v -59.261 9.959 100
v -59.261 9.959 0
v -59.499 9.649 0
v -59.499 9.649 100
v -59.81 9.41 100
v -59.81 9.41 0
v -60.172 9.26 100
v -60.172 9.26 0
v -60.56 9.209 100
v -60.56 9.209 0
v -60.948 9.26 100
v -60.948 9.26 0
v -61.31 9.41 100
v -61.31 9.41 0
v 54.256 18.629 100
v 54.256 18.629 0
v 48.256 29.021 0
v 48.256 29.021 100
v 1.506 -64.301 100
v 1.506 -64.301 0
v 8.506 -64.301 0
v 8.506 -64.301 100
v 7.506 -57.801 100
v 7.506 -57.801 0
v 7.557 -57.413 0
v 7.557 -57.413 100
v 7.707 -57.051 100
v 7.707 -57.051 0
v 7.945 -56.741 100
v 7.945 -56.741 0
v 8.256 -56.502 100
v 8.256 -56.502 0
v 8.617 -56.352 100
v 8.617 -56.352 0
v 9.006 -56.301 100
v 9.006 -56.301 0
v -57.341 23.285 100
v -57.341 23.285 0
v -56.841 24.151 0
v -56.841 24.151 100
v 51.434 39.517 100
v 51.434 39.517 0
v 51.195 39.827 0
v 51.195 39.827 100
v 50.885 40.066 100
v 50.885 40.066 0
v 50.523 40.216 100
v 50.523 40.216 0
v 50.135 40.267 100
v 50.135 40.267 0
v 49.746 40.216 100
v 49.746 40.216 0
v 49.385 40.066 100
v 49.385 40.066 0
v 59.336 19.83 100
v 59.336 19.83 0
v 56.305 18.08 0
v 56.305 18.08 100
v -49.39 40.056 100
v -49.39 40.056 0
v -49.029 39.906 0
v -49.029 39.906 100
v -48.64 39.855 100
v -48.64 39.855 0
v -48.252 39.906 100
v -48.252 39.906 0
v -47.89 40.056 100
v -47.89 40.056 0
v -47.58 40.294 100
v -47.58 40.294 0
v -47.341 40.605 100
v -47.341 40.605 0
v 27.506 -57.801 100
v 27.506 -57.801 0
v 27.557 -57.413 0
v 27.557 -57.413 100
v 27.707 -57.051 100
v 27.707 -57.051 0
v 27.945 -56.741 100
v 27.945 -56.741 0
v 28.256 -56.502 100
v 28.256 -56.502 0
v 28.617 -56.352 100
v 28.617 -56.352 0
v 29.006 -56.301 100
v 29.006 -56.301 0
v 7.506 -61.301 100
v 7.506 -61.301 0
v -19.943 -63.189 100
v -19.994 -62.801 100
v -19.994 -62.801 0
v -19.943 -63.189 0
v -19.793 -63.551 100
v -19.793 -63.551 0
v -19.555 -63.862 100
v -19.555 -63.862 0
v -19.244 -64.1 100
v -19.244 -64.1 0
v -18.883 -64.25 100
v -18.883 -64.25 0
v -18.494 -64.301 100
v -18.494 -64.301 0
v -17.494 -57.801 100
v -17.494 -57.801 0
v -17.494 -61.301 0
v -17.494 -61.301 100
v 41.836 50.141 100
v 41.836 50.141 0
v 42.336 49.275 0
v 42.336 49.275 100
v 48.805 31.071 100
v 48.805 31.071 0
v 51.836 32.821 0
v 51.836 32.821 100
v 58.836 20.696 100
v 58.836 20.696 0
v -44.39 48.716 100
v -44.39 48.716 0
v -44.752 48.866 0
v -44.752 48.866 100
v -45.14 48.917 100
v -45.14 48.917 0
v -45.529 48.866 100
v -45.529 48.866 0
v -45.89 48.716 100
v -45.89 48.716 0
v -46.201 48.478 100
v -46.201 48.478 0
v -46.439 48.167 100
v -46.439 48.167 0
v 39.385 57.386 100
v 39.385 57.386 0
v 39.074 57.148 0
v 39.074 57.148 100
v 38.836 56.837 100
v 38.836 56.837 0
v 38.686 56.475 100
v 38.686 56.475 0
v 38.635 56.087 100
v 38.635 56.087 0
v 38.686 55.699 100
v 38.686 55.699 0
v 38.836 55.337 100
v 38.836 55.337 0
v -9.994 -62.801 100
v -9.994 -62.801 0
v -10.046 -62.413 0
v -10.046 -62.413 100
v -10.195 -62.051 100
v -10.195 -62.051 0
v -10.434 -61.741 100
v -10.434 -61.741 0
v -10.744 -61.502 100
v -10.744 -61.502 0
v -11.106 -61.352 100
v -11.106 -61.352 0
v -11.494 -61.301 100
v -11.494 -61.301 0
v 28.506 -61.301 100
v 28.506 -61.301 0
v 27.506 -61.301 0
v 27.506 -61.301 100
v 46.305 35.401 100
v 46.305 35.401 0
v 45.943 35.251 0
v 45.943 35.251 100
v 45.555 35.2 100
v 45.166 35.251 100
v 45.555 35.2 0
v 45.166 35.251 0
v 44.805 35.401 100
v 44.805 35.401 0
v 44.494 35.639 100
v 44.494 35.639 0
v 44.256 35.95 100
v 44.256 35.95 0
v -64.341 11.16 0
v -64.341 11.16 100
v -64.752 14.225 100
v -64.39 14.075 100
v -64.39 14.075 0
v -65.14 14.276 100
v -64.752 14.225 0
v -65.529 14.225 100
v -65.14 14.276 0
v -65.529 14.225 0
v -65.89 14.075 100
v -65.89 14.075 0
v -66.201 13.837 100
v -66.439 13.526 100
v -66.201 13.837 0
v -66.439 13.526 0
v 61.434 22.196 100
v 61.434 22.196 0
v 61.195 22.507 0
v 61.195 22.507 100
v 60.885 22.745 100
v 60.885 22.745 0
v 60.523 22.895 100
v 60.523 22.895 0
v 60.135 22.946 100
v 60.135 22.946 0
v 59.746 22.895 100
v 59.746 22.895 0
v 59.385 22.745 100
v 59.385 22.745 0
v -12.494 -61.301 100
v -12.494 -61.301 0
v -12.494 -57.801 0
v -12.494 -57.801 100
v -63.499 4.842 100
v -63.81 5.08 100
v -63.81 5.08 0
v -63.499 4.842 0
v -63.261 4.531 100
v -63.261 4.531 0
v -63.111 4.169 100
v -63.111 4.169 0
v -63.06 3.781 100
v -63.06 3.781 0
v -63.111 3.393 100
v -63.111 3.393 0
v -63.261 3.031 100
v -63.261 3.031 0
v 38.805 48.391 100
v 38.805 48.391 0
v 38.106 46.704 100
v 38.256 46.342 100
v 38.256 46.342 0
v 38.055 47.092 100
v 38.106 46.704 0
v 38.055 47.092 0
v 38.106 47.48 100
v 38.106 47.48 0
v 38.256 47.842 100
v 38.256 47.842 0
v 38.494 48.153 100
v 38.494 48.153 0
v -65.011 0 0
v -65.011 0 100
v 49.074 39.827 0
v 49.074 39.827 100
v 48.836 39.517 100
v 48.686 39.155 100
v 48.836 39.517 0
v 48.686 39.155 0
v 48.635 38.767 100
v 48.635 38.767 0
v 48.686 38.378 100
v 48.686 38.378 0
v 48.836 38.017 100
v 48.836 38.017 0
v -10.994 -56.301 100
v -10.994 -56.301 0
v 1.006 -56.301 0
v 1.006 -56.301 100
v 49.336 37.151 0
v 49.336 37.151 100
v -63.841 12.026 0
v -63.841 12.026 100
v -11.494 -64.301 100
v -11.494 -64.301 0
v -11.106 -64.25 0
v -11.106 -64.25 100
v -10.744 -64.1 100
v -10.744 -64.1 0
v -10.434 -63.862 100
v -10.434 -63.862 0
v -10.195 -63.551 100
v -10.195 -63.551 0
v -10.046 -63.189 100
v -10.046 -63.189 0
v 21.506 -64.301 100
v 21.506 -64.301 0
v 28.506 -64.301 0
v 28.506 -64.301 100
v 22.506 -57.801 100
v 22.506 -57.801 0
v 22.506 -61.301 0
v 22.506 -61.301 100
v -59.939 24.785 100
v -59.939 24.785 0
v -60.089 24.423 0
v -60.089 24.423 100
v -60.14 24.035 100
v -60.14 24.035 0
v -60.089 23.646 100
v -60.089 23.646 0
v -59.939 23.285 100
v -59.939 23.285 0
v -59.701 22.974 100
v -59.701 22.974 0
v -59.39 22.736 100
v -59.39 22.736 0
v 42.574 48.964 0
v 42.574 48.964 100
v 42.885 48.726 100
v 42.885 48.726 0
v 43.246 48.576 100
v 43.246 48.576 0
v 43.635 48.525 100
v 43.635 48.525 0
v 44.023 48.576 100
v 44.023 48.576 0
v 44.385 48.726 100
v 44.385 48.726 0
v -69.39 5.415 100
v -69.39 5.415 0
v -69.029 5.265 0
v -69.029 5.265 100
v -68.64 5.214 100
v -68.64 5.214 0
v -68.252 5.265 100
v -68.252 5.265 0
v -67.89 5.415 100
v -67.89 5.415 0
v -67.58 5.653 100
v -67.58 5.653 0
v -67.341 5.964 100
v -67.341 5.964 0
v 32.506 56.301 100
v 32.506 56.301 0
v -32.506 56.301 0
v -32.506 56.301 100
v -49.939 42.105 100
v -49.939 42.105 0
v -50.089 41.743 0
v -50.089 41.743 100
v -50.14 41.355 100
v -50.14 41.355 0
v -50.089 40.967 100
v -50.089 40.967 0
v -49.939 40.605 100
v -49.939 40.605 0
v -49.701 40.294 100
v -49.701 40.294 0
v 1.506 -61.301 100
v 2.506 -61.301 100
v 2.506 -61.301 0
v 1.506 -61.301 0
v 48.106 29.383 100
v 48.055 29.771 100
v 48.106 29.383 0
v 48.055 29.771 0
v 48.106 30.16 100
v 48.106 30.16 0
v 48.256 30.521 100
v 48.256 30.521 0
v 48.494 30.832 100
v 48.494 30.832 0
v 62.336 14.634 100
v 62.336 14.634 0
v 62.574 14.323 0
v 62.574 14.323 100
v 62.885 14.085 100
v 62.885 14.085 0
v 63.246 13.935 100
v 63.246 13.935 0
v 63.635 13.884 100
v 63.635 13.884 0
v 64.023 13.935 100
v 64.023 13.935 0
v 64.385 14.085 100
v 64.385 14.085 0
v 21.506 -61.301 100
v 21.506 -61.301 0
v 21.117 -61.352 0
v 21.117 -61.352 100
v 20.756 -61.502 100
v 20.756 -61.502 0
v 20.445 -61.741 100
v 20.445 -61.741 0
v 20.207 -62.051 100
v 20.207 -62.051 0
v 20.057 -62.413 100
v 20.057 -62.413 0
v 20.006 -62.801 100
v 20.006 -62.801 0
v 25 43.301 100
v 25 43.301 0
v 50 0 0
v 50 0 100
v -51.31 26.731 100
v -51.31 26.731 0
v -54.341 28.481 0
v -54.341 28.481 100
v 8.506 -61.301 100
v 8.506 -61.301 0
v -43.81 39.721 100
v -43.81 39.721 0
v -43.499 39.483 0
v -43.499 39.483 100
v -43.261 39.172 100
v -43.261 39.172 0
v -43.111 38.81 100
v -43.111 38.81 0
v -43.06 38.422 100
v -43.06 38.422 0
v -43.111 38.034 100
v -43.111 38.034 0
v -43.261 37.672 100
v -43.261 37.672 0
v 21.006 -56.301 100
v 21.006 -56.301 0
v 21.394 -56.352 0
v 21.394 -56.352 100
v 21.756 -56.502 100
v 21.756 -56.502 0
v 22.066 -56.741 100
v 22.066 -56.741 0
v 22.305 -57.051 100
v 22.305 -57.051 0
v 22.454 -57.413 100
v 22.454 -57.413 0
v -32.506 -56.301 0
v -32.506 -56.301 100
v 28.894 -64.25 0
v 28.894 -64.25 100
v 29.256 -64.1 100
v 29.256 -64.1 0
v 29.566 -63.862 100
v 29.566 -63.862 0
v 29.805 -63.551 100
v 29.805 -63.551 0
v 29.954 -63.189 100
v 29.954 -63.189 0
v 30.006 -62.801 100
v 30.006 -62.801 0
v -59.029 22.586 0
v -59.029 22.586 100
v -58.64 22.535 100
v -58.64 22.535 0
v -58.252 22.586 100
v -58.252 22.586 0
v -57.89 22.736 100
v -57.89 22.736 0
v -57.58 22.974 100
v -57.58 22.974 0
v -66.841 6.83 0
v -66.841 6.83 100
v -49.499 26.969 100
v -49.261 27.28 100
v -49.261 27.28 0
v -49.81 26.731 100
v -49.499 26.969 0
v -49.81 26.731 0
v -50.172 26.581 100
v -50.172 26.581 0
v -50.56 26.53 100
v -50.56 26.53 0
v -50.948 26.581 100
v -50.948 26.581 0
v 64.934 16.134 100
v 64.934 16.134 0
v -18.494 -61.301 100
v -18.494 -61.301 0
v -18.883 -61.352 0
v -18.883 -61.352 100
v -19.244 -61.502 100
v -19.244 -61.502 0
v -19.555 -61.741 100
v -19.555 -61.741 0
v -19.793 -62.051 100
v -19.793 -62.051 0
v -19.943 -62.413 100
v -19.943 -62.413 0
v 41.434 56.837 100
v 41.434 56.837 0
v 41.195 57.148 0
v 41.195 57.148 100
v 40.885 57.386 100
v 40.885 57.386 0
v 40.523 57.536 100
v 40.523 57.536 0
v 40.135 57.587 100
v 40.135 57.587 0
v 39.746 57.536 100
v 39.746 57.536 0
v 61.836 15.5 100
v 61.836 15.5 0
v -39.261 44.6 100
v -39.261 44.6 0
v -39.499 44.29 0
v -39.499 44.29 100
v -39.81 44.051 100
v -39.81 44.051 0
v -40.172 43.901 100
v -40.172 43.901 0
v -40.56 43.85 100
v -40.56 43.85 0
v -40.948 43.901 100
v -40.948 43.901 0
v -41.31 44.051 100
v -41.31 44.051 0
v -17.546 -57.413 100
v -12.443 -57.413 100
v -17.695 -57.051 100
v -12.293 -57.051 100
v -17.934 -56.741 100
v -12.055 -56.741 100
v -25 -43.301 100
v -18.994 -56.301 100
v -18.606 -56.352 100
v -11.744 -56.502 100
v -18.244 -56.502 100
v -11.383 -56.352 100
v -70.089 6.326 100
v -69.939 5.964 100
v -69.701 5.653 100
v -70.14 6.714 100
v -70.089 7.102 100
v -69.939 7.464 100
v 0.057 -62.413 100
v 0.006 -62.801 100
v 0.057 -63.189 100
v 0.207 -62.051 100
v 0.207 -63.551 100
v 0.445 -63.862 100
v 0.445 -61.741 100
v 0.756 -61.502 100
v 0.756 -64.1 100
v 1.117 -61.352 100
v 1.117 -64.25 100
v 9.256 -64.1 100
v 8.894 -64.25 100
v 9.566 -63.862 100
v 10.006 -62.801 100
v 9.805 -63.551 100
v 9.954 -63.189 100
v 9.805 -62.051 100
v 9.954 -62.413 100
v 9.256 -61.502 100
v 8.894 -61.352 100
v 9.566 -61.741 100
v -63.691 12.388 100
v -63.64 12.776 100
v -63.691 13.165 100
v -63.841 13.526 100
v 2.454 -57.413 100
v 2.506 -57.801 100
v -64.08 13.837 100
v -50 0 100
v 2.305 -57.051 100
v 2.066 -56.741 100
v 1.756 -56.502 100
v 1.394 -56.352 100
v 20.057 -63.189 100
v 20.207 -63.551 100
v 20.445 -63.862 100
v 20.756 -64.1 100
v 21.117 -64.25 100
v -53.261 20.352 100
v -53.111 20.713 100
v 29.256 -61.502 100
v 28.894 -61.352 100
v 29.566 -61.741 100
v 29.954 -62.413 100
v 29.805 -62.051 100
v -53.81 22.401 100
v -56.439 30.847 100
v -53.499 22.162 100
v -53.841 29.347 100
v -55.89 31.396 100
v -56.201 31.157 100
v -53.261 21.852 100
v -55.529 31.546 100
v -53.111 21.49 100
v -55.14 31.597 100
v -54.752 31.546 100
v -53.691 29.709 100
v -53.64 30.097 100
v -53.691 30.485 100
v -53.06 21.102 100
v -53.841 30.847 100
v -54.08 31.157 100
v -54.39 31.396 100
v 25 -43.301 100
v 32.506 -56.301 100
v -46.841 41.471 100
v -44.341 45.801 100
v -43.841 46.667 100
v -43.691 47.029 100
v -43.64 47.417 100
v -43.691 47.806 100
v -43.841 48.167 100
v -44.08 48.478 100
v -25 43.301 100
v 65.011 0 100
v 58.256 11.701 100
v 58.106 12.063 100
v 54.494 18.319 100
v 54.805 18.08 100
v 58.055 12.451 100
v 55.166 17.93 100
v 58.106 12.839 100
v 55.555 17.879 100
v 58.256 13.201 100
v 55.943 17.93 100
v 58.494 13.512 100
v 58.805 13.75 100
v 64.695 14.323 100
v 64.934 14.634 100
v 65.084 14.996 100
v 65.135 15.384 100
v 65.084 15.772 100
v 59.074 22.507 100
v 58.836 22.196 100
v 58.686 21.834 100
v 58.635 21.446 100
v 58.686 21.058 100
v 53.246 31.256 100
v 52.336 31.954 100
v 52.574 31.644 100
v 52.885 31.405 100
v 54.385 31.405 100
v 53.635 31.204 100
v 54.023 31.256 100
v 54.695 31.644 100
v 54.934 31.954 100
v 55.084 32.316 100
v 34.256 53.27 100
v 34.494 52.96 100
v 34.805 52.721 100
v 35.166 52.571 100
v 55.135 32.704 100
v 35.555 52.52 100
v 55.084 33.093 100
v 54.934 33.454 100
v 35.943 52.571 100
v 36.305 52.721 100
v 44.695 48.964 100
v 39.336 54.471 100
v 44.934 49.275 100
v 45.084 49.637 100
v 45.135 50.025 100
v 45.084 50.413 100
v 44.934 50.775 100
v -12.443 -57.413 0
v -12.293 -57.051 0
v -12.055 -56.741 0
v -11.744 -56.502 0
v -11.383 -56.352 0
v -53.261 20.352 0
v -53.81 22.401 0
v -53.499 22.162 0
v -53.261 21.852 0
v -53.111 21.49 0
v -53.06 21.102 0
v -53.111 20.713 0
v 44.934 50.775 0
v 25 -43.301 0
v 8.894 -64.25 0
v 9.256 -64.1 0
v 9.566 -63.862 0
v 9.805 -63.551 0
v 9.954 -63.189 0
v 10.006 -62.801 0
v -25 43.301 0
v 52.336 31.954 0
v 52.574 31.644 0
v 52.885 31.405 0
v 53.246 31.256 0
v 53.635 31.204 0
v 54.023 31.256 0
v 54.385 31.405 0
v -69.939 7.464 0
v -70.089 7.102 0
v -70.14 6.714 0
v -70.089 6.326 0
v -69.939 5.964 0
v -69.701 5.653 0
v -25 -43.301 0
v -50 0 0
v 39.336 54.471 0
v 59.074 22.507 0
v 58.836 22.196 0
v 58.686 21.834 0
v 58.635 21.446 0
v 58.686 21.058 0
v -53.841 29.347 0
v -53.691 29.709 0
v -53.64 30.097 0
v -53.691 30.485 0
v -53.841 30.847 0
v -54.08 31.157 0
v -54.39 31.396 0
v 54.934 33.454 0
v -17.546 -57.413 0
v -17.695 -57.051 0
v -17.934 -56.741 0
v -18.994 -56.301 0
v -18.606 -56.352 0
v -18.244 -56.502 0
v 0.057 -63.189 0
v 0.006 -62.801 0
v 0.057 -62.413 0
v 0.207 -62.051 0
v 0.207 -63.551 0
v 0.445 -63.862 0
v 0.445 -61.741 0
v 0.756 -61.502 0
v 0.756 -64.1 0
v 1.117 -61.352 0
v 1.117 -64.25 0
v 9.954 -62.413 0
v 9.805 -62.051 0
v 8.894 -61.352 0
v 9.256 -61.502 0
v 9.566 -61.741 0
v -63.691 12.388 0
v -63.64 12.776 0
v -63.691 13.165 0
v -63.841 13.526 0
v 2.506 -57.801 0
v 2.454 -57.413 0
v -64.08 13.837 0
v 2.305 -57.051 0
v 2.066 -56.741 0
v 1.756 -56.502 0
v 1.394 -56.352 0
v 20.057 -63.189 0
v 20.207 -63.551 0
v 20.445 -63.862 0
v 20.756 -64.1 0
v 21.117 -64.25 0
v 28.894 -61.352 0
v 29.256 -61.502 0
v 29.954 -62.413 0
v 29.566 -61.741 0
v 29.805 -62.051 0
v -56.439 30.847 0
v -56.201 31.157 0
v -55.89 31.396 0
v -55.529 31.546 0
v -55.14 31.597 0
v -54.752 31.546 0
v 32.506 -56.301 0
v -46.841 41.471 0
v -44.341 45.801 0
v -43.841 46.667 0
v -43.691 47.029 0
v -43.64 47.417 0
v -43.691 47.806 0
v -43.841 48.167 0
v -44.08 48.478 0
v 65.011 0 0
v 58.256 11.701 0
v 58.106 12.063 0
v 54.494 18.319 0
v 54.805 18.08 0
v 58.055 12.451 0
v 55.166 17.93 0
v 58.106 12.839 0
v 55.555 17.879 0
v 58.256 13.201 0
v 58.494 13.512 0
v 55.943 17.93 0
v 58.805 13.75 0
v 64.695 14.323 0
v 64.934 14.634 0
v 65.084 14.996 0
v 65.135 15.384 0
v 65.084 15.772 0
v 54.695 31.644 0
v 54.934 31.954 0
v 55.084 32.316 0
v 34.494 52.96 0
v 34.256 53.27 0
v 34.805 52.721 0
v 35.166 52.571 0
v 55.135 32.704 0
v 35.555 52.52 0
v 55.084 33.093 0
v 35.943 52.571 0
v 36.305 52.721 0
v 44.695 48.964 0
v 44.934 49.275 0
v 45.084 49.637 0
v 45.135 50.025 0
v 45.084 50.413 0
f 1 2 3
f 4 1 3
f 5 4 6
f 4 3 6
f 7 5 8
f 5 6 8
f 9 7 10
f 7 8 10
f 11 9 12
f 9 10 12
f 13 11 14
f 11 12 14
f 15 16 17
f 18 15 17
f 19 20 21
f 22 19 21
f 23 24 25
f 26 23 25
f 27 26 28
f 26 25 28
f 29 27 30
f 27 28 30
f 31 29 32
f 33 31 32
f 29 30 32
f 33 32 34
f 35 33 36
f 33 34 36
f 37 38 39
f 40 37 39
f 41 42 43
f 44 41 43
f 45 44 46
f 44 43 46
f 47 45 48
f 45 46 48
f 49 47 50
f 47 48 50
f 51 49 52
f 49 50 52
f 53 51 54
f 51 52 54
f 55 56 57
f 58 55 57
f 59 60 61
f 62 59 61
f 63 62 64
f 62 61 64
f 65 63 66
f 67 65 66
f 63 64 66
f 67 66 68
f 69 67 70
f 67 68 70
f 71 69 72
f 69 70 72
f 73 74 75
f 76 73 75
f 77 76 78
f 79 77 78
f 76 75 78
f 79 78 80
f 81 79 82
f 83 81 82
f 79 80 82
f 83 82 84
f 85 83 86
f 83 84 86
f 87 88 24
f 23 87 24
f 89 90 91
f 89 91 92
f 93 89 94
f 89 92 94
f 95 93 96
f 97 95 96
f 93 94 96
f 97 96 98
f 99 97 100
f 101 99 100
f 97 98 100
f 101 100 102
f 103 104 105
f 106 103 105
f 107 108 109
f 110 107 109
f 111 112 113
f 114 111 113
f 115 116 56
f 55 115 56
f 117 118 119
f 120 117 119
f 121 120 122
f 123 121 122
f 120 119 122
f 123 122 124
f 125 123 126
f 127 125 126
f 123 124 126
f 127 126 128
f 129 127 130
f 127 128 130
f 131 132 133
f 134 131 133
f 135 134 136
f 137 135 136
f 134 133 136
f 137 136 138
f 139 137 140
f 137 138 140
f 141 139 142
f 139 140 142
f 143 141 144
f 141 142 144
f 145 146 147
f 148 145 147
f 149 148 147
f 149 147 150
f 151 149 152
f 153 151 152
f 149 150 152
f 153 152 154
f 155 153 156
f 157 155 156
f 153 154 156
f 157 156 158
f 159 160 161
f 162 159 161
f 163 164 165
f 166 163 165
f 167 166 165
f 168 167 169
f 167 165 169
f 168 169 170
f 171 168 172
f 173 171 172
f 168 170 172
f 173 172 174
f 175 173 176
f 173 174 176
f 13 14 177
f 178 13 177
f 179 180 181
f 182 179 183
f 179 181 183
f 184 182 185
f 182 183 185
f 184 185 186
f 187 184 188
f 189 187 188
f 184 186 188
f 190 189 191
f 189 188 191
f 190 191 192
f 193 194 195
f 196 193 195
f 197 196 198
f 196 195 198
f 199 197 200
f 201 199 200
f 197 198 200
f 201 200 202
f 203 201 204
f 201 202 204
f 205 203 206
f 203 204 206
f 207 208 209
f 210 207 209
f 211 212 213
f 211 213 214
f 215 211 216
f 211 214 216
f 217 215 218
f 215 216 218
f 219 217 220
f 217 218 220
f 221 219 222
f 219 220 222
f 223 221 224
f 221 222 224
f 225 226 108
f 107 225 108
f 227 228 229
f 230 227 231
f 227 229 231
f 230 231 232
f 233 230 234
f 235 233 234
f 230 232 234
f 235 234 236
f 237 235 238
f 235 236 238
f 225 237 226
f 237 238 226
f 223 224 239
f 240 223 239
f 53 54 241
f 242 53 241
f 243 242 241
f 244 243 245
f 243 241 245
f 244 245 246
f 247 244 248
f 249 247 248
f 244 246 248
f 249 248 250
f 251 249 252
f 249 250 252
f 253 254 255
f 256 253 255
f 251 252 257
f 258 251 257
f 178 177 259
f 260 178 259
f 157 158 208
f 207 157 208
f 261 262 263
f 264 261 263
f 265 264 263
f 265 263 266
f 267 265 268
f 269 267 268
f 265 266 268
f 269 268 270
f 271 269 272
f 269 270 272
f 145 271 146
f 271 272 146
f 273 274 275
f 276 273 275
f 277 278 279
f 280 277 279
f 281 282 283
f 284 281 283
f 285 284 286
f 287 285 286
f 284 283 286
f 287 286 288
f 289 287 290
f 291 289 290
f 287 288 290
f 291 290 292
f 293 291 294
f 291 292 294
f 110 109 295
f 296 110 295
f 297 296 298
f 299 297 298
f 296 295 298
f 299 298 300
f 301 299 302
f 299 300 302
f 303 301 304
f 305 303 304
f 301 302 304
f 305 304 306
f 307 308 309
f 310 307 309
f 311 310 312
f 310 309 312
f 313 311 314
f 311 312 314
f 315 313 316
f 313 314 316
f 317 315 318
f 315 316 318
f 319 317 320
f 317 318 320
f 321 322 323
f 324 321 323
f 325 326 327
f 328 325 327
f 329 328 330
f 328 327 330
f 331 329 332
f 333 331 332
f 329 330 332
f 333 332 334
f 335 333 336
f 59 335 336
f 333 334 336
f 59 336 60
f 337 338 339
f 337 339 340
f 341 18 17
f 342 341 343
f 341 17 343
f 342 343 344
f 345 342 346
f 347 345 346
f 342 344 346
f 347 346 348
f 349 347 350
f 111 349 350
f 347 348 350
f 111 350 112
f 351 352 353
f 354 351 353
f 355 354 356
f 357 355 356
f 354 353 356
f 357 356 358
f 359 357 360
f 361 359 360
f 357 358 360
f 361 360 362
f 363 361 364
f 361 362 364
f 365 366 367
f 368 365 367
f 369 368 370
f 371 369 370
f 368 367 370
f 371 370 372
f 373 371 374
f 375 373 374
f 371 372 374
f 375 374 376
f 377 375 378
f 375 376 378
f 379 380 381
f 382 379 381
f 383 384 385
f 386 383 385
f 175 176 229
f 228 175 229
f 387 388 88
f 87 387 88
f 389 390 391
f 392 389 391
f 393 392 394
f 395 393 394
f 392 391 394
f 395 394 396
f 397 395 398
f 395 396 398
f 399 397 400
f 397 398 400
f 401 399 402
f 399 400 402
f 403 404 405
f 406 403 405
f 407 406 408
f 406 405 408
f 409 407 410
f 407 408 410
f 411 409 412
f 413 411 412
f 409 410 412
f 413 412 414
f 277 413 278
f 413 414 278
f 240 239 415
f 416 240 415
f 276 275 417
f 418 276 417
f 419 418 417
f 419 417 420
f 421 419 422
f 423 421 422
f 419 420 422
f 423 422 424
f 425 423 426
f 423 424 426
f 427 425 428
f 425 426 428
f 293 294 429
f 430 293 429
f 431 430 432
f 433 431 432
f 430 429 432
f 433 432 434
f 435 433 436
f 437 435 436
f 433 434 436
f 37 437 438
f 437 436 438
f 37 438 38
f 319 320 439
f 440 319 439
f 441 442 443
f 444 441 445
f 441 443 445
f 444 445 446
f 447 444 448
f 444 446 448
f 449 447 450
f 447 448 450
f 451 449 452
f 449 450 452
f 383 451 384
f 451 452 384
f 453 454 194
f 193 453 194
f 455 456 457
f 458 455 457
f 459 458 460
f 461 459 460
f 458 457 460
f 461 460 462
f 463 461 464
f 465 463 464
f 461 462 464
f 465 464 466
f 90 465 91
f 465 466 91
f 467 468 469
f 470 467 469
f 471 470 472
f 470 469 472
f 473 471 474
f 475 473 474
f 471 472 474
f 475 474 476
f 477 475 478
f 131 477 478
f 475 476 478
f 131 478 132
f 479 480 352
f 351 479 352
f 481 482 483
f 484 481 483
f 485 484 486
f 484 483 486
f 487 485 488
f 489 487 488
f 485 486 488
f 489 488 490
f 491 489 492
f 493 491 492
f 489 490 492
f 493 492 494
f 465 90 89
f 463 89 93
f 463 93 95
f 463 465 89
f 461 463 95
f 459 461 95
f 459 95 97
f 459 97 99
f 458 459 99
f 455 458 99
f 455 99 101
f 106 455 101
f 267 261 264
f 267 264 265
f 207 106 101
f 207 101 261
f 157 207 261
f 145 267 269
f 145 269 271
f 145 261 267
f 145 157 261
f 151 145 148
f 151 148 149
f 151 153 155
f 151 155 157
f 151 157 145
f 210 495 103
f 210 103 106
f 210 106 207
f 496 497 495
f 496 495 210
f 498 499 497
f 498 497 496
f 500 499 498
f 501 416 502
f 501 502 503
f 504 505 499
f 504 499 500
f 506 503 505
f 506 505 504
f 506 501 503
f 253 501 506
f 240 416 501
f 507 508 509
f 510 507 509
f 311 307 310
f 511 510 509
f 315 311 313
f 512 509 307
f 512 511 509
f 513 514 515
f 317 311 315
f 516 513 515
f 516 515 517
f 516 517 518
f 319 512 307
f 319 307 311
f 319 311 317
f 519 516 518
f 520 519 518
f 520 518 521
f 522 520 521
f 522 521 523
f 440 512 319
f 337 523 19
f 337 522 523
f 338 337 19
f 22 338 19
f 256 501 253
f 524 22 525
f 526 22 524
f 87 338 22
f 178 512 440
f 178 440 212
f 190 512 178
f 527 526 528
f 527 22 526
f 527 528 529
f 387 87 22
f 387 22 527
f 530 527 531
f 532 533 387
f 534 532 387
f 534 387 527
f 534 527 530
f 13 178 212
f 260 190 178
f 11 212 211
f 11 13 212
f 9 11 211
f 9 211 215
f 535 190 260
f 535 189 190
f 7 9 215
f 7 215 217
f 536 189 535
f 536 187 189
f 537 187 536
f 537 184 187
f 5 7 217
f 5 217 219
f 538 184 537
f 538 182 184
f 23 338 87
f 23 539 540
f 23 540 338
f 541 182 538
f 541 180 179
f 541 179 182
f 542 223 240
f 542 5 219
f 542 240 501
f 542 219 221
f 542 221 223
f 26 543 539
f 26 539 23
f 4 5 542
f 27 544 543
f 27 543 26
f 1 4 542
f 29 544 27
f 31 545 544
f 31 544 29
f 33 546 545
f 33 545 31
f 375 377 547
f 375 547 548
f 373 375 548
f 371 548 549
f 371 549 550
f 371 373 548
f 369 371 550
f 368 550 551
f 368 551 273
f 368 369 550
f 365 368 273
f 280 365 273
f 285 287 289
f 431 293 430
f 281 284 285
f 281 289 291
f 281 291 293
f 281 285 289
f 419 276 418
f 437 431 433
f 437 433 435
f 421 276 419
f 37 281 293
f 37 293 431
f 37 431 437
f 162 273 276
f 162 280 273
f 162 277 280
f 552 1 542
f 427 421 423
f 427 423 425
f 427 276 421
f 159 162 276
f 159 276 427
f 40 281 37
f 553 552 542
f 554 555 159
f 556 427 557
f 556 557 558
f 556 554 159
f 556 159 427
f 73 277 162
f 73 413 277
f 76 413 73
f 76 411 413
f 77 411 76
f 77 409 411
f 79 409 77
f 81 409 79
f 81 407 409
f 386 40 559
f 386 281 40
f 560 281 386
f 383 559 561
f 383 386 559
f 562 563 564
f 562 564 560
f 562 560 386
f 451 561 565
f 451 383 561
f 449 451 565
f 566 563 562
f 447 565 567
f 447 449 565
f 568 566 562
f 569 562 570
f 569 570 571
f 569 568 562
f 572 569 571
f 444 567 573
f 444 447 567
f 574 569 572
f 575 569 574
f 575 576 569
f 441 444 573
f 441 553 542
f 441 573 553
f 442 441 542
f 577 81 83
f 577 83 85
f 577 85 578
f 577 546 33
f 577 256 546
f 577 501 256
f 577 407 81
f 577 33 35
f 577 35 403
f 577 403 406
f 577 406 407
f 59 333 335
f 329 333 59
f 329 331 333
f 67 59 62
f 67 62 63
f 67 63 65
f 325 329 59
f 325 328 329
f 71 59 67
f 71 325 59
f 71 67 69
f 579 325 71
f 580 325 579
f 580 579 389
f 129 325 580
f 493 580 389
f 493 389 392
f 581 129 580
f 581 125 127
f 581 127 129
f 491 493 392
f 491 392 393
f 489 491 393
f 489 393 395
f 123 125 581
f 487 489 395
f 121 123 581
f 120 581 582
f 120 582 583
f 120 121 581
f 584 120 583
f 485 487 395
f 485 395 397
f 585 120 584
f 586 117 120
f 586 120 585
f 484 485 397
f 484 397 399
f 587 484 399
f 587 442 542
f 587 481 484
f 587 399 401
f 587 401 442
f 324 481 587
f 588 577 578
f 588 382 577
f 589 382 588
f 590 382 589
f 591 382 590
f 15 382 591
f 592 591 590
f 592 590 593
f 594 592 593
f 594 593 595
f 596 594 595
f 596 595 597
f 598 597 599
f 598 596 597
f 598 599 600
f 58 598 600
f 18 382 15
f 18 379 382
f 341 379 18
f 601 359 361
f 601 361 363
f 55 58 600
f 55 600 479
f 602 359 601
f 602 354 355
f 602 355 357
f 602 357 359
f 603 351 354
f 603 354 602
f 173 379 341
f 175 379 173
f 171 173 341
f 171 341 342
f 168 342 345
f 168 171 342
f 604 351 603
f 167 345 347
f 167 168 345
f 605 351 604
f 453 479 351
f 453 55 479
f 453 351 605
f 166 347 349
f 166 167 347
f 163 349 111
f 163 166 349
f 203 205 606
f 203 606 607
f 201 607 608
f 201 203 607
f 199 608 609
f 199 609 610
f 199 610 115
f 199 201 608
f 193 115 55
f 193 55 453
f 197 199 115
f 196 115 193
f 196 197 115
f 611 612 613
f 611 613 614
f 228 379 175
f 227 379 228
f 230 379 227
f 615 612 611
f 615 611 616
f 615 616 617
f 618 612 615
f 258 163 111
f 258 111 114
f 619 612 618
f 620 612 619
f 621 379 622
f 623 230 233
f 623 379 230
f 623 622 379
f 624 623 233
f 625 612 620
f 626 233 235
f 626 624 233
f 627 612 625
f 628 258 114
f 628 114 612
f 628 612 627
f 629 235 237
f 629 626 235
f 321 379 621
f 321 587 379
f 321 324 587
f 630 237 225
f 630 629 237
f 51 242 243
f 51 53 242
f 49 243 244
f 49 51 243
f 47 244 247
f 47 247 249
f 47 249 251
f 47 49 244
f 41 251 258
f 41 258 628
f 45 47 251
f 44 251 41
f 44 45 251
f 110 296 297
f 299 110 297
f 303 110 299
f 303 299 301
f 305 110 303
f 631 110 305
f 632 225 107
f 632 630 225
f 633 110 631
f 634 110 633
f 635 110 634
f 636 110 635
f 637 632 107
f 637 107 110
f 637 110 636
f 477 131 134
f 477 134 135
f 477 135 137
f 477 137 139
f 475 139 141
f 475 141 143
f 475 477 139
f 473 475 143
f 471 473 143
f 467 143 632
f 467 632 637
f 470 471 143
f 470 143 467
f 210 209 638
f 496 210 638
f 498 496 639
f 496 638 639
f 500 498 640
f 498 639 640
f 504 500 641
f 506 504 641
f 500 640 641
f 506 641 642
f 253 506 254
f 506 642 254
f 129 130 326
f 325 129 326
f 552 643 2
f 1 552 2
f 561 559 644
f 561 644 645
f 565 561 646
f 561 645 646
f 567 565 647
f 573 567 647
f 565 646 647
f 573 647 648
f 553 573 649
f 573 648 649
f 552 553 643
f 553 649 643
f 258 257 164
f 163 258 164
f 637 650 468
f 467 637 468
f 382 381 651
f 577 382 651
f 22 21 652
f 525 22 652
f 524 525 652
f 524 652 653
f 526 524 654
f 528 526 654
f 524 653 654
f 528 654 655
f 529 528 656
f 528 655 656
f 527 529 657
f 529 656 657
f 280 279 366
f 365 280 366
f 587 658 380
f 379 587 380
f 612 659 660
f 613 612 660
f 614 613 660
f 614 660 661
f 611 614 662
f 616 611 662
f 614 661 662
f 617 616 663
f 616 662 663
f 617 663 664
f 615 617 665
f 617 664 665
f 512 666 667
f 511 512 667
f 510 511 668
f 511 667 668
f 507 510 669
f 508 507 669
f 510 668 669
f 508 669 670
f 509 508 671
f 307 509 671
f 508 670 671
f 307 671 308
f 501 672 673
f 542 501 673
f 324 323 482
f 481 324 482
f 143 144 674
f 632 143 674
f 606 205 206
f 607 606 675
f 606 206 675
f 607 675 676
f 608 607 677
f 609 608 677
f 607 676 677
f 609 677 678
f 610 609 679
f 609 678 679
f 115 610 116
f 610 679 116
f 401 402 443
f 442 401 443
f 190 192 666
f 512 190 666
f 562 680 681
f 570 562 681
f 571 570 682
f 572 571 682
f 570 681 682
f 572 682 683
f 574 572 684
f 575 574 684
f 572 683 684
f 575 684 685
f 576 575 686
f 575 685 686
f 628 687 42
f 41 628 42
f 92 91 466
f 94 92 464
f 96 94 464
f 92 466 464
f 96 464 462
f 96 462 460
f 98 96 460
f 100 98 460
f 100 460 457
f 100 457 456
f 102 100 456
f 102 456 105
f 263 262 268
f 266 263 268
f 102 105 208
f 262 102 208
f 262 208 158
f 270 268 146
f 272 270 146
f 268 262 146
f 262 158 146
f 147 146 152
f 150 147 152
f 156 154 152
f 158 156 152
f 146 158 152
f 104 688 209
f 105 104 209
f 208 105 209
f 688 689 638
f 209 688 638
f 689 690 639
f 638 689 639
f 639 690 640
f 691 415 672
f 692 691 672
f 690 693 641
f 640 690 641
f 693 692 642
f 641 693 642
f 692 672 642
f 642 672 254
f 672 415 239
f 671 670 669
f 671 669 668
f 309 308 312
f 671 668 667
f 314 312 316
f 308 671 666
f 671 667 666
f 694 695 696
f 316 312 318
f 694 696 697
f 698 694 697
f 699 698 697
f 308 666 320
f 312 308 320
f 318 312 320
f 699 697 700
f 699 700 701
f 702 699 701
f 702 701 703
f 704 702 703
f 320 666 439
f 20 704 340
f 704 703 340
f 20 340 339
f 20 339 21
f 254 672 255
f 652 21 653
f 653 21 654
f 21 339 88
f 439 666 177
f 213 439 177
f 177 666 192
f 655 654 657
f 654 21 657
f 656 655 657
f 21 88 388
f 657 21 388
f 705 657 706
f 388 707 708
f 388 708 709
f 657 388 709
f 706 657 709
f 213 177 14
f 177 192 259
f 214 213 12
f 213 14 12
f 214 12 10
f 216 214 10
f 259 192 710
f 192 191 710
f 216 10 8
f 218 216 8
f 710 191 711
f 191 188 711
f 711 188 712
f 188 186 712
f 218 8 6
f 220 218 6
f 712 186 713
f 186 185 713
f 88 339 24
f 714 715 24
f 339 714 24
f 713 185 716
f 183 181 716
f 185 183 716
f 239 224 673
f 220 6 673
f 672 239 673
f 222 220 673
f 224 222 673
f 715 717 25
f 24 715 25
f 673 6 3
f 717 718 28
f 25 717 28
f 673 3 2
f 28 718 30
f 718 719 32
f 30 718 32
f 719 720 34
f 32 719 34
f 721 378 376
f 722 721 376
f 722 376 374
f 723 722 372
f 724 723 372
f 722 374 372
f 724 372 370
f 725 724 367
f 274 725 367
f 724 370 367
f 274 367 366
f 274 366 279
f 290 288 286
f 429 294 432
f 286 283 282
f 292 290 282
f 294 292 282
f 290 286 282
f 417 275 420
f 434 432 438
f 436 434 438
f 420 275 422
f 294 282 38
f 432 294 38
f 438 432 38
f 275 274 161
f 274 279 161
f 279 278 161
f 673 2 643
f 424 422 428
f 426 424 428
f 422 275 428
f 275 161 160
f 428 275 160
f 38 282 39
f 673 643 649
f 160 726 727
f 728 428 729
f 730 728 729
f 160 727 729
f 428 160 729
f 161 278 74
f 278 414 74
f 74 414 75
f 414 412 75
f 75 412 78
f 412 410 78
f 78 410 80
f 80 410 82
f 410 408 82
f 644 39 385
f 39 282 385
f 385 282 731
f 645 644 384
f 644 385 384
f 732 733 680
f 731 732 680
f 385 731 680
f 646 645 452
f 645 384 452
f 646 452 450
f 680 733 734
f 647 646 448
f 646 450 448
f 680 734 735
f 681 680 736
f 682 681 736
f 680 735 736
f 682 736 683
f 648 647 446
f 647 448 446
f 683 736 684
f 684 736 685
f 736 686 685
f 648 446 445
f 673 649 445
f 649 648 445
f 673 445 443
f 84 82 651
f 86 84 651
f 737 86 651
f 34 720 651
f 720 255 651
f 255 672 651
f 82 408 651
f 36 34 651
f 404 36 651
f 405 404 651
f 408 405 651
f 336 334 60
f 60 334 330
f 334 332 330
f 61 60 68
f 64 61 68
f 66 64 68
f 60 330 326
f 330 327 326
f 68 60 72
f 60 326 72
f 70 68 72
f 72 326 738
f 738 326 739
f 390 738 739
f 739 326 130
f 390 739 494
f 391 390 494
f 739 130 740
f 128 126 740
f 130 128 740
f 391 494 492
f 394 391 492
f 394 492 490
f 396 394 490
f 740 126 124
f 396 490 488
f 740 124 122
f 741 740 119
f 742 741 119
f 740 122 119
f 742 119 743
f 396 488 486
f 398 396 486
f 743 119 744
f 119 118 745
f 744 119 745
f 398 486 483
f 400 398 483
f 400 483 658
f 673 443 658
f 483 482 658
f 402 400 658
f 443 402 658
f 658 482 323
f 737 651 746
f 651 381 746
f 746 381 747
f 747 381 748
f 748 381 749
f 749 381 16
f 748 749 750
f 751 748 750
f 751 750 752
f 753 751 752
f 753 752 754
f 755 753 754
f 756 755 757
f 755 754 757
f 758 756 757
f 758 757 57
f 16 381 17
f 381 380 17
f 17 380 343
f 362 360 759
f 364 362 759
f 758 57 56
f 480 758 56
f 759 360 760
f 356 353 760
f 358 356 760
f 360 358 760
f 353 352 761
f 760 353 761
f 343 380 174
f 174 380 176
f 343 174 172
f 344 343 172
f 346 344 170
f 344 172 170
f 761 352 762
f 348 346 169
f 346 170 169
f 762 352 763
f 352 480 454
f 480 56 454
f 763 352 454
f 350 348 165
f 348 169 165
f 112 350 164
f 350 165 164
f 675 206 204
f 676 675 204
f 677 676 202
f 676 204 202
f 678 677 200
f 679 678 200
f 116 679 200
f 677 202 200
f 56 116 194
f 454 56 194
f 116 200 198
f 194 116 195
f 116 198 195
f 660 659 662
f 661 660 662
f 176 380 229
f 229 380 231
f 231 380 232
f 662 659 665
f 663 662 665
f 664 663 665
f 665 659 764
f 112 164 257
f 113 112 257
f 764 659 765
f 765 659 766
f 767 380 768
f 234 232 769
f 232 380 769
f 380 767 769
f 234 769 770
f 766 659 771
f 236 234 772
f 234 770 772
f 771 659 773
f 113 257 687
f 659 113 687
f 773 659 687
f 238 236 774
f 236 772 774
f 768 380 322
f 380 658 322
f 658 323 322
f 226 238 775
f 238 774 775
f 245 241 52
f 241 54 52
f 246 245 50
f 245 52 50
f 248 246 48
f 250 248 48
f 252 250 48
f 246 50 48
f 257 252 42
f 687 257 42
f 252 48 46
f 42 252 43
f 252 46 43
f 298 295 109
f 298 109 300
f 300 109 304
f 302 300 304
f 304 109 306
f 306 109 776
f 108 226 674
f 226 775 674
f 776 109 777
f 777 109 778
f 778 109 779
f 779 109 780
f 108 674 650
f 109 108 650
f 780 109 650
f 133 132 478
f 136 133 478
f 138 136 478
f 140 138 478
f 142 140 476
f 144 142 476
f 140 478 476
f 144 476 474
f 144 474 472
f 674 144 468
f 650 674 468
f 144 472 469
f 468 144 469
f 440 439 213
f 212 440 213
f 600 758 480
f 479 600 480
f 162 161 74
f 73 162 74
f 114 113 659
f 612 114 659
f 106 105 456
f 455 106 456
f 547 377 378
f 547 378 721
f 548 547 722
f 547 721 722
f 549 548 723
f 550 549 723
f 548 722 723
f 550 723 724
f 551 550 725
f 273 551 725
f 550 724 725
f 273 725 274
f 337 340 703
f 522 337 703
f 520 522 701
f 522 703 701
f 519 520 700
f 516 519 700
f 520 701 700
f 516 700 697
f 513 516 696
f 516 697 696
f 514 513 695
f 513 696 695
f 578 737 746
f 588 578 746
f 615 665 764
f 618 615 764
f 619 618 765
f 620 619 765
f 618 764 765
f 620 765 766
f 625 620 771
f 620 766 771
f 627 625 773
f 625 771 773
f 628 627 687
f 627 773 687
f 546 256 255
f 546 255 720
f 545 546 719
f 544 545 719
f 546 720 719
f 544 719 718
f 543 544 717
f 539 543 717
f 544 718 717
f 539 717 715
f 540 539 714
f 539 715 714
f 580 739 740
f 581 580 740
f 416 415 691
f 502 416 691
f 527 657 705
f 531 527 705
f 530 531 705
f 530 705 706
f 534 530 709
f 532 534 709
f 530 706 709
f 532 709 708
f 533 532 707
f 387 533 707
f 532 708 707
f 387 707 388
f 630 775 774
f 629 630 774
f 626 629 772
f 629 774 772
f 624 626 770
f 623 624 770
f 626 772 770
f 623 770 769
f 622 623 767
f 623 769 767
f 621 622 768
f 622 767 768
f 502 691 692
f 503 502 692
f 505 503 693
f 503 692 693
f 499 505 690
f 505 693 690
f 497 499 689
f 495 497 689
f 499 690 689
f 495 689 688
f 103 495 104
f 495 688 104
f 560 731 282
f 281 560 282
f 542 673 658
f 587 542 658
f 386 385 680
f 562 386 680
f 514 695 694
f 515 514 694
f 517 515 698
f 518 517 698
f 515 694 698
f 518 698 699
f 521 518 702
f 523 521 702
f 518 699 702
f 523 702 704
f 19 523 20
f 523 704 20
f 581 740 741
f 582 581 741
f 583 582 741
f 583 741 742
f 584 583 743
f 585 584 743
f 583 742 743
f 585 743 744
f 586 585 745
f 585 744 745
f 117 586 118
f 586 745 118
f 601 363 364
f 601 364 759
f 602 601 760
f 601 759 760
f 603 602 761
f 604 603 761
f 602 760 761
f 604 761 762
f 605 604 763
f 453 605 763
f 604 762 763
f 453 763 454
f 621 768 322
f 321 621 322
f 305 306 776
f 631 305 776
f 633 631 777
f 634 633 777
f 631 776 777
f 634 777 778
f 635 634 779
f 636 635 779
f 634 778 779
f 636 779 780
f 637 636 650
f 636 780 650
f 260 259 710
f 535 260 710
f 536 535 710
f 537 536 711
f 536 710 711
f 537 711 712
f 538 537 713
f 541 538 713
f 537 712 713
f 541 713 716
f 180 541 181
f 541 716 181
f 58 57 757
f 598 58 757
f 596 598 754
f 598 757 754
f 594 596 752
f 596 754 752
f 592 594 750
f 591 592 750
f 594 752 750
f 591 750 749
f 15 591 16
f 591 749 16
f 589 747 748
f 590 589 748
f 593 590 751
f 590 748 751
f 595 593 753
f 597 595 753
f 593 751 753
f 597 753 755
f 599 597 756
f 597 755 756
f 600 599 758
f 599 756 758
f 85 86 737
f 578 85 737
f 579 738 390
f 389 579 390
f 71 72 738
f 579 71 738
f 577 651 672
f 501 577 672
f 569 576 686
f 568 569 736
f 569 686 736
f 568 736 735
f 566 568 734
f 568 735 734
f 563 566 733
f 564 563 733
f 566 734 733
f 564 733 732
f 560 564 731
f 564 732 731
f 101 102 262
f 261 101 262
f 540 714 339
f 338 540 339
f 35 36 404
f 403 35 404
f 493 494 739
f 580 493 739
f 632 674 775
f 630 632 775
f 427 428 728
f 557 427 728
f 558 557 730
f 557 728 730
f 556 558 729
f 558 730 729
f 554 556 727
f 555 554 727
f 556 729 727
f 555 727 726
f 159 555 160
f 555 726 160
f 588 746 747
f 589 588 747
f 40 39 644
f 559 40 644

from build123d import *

# Parameters (mm, degrees)
F1_DEPTH = 100


with BuildPart() as f1:
    # F0 (on Top) → F1 (new body)
    with BuildSketch(Plane.XY):
        with BuildLine():
            Line((-63.261107, 3.031089), (-65.011107, 0))
            Line((-65.011107, 0), (-32.505553, -56.30127))
            Line((-32.505553, -56.30127), (-18.994447, -56.30127))
            Line((-18.994447, -56.30127), (-10.994447, -56.30127))
            Line((-10.994447, -56.30127), (1.005553, -56.30127))
            Line((1.005553, -56.30127), (9.005553, -56.30127))
            Line((9.005553, -56.30127), (21.005553, -56.30127))
            Line((21.005553, -56.30127), (29.005553, -56.30127))
            Line((29.005553, -56.30127), (32.505553, -56.30127))
            Line((32.505553, -56.30127), (65.011107, 0))
            Line((65.011107, 0), (58.255553, 11.700962))
            Line((58.255553, 11.700962), (54.255553, 18.629165))
            Line((54.255553, 18.629165), (48.255553, 29.02147))
            Line((48.255553, 29.02147), (44.255553, 35.949673))
            Line((44.255553, 35.949673), (38.255553, 46.341978))
            ThreePointArc((38.255553, 46.341978), (38.105703, 47.480207), (38.804592, 48.391016))
            Line((38.804592, 48.391016), (41.835681, 50.141016))
            Line((41.835681, 50.141016), (42.335681, 49.274991))
            ThreePointArc((42.335681, 49.274991), (43.24649, 48.576102), (44.384719, 48.725953))
            ThreePointArc((44.384719, 48.725953), (45.083607, 49.636762), (44.933757, 50.774991))
            Line((44.933757, 50.774991), (41.433757, 56.837169))
            ThreePointArc((41.433757, 56.837169), (40.522947, 57.536057), (39.384719, 57.386207))
            ThreePointArc((39.384719, 57.386207), (38.68583, 56.475397), (38.835681, 55.337169))
            Line((38.835681, 55.337169), (39.335681, 54.471143))
            Line((39.335681, 54.471143), (36.304592, 52.721143))
            ThreePointArc((36.304592, 52.721143), (35.166363, 52.571293), (34.255553, 53.270181))
            Line((34.255553, 53.270181), (32.505553, 56.30127))
            Line((32.505553, 56.30127), (-32.505553, 56.30127))
            Line((-32.505553, 56.30127), (-39.261107, 44.600308))
            Line((-39.261107, 44.600308), (-43.261107, 37.672105))
            Line((-43.261107, 37.672105), (-49.261107, 27.2798))
            Line((-49.261107, 27.2798), (-53.261107, 20.351597))
            Line((-53.261107, 20.351597), (-59.261107, 9.959292))
            Line((-59.261107, 9.959292), (-63.261107, 3.031089))
        make_face()
        Polygon((-50, 0), (-25, 43.30127), (25, 43.30127), (50, 0), (25, -43.30127), (-25, -43.30127), align=None, mode=Mode.SUBTRACT)
        with BuildLine():
            ThreePointArc((-63.810145, 5.080127), (-63.111256, 4.169317), (-63.261107, 3.031089))
            Line((-63.261107, 3.031089), (-59.261107, 9.959292))
            ThreePointArc((-59.261107, 9.959292), (-60.171917, 9.260403), (-61.310145, 9.410254))
            Line((-61.310145, 9.410254), (-64.341234, 11.160254))
            Line((-64.341234, 11.160254), (-63.841234, 12.026279))
            ThreePointArc((-63.841234, 12.026279), (-63.691383, 13.164508), (-64.390272, 14.075318))
            ThreePointArc((-64.390272, 14.075318), (-65.528501, 14.225168), (-66.43931, 13.526279))
            Line((-66.43931, 13.526279), (-69.93931, 7.464102))
            ThreePointArc((-69.93931, 7.464102), (-70.089161, 6.325873), (-69.390272, 5.415064))
            ThreePointArc((-69.390272, 5.415064), (-68.252044, 5.265213), (-67.341234, 5.964102))
            Line((-67.341234, 5.964102), (-66.841234, 6.830127))
            Line((-66.841234, 6.830127), (-63.810145, 5.080127))
        make_face()
        with BuildLine():
            Line((-10.994447, -56.30127), (-18.994447, -56.30127))
            ThreePointArc((-18.994447, -56.30127), (-17.933786, -56.74061), (-17.494447, -57.80127))
            Line((-17.494447, -57.80127), (-17.494447, -61.30127))
            Line((-17.494447, -61.30127), (-18.494447, -61.30127))
            ThreePointArc((-18.494447, -61.30127), (-19.555107, -61.74061), (-19.994447, -62.80127))
            ThreePointArc((-19.994447, -62.80127), (-19.555107, -63.86193), (-18.494447, -64.30127))
            Line((-18.494447, -64.30127), (-11.494447, -64.30127))
            ThreePointArc((-11.494447, -64.30127), (-10.433786, -63.86193), (-9.994447, -62.80127))
            ThreePointArc((-9.994447, -62.80127), (-10.433786, -61.74061), (-11.494447, -61.30127))
            Line((-11.494447, -61.30127), (-12.494447, -61.30127))
            Line((-12.494447, -61.30127), (-12.494447, -57.80127))
            ThreePointArc((-12.494447, -57.80127), (-12.055107, -56.74061), (-10.994447, -56.30127))
        make_face()
        with BuildLine():
            ThreePointArc((-53.810145, 22.400635), (-53.111256, 21.489826), (-53.261107, 20.351597))
            Line((-53.261107, 20.351597), (-49.261107, 27.2798))
            ThreePointArc((-49.261107, 27.2798), (-50.171917, 26.580911), (-51.310145, 26.730762))
            Line((-51.310145, 26.730762), (-54.341234, 28.480762))
            Line((-54.341234, 28.480762), (-53.841234, 29.346788))
            ThreePointArc((-53.841234, 29.346788), (-53.691383, 30.485016), (-54.390272, 31.395826))
            ThreePointArc((-54.390272, 31.395826), (-55.528501, 31.545676), (-56.43931, 30.846788))
            Line((-56.43931, 30.846788), (-59.93931, 24.78461))
            ThreePointArc((-59.93931, 24.78461), (-60.089161, 23.646381), (-59.390272, 22.735572))
            ThreePointArc((-59.390272, 22.735572), (-58.252044, 22.585721), (-57.341234, 23.28461))
            Line((-57.341234, 23.28461), (-56.841234, 24.150635))
            Line((-56.841234, 24.150635), (-53.810145, 22.400635))
        make_face()
        with BuildLine():
            Line((9.005553, -56.30127), (1.005553, -56.30127))
            ThreePointArc((1.005553, -56.30127), (2.066214, -56.74061), (2.505553, -57.80127))
            Line((2.505553, -57.80127), (2.505553, -61.30127))
            Line((2.505553, -61.30127), (1.505553, -61.30127))
            ThreePointArc((1.505553, -61.30127), (0.444893, -61.74061), (0.005553, -62.80127))
            ThreePointArc((0.005553, -62.80127), (0.444893, -63.86193), (1.505553, -64.30127))
            Line((1.505553, -64.30127), (8.505553, -64.30127))
            ThreePointArc((8.505553, -64.30127), (9.566214, -63.86193), (10.005553, -62.80127))
            ThreePointArc((10.005553, -62.80127), (9.566214, -61.74061), (8.505553, -61.30127))
            Line((8.505553, -61.30127), (7.505553, -61.30127))
            Line((7.505553, -61.30127), (7.505553, -57.80127))
            ThreePointArc((7.505553, -57.80127), (7.944893, -56.74061), (9.005553, -56.30127))
        make_face()
        with BuildLine():
            ThreePointArc((-43.810145, 39.721143), (-43.111256, 38.810334), (-43.261107, 37.672105))
            Line((-43.261107, 37.672105), (-39.261107, 44.600308))
            ThreePointArc((-39.261107, 44.600308), (-40.171917, 43.90142), (-41.310145, 44.05127))
            Line((-41.310145, 44.05127), (-44.341234, 45.80127))
            Line((-44.341234, 45.80127), (-43.841234, 46.667296))
            ThreePointArc((-43.841234, 46.667296), (-43.691383, 47.805524), (-44.390272, 48.716334))
            ThreePointArc((-44.390272, 48.716334), (-45.528501, 48.866184), (-46.43931, 48.167296))
            Line((-46.43931, 48.167296), (-49.93931, 42.105118))
            ThreePointArc((-49.93931, 42.105118), (-50.089161, 40.966889), (-49.390272, 40.05608))
            ThreePointArc((-49.390272, 40.05608), (-48.252044, 39.906229), (-47.341234, 40.605118))
            Line((-47.341234, 40.605118), (-46.841234, 41.471143))
            Line((-46.841234, 41.471143), (-43.810145, 39.721143))
        make_face()
        with BuildLine():
            Line((29.005553, -56.30127), (21.005553, -56.30127))
            ThreePointArc((21.005553, -56.30127), (22.066214, -56.74061), (22.505553, -57.80127))
            Line((22.505553, -57.80127), (22.505553, -61.30127))
            Line((22.505553, -61.30127), (21.505553, -61.30127))
            ThreePointArc((21.505553, -61.30127), (20.444893, -61.74061), (20.005553, -62.80127))
            ThreePointArc((20.005553, -62.80127), (20.444893, -63.86193), (21.505553, -64.30127))
            Line((21.505553, -64.30127), (28.505553, -64.30127))
            ThreePointArc((28.505553, -64.30127), (29.566214, -63.86193), (30.005553, -62.80127))
            ThreePointArc((30.005553, -62.80127), (29.566214, -61.74061), (28.505553, -61.30127))
            Line((28.505553, -61.30127), (27.505553, -61.30127))
            Line((27.505553, -61.30127), (27.505553, -57.80127))
            ThreePointArc((27.505553, -57.80127), (27.944893, -56.74061), (29.005553, -56.30127))
        make_face()
        with BuildLine():
            Line((54.255553, 18.629165), (58.255553, 11.700962))
            ThreePointArc((58.255553, 11.700962), (58.105703, 12.83919), (58.804592, 13.75))
            Line((58.804592, 13.75), (61.835681, 15.5))
            Line((61.835681, 15.5), (62.335681, 14.633975))
            ThreePointArc((62.335681, 14.633975), (63.24649, 13.935086), (64.384719, 14.084936))
            ThreePointArc((64.384719, 14.084936), (65.083607, 14.995746), (64.933757, 16.133975))
            Line((64.933757, 16.133975), (61.433757, 22.196152))
            ThreePointArc((61.433757, 22.196152), (60.522947, 22.895041), (59.384719, 22.745191))
            ThreePointArc((59.384719, 22.745191), (58.68583, 21.834381), (58.835681, 20.696152))
            Line((58.835681, 20.696152), (59.335681, 19.830127))
            Line((59.335681, 19.830127), (56.304592, 18.080127))
            ThreePointArc((56.304592, 18.080127), (55.166363, 17.930276), (54.255553, 18.629165))
        make_face()
        with BuildLine():
            Line((44.255553, 35.949673), (48.255553, 29.02147))
            ThreePointArc((48.255553, 29.02147), (48.105703, 30.159699), (48.804592, 31.070508))
            Line((48.804592, 31.070508), (51.835681, 32.820508))
            Line((51.835681, 32.820508), (52.335681, 31.954483))
            ThreePointArc((52.335681, 31.954483), (53.24649, 31.255594), (54.384719, 31.405445))
            ThreePointArc((54.384719, 31.405445), (55.083607, 32.316254), (54.933757, 33.454483))
            Line((54.933757, 33.454483), (51.433757, 39.51666))
            ThreePointArc((51.433757, 39.51666), (50.522947, 40.215549), (49.384719, 40.065699))
            ThreePointArc((49.384719, 40.065699), (48.68583, 39.154889), (48.835681, 38.01666))
            Line((48.835681, 38.01666), (49.335681, 37.150635))
            Line((49.335681, 37.150635), (46.304592, 35.400635))
            ThreePointArc((46.304592, 35.400635), (45.166363, 35.250784), (44.255553, 35.949673))
        make_face()
    extrude(amount=F1_DEPTH)


solid = f1.part
